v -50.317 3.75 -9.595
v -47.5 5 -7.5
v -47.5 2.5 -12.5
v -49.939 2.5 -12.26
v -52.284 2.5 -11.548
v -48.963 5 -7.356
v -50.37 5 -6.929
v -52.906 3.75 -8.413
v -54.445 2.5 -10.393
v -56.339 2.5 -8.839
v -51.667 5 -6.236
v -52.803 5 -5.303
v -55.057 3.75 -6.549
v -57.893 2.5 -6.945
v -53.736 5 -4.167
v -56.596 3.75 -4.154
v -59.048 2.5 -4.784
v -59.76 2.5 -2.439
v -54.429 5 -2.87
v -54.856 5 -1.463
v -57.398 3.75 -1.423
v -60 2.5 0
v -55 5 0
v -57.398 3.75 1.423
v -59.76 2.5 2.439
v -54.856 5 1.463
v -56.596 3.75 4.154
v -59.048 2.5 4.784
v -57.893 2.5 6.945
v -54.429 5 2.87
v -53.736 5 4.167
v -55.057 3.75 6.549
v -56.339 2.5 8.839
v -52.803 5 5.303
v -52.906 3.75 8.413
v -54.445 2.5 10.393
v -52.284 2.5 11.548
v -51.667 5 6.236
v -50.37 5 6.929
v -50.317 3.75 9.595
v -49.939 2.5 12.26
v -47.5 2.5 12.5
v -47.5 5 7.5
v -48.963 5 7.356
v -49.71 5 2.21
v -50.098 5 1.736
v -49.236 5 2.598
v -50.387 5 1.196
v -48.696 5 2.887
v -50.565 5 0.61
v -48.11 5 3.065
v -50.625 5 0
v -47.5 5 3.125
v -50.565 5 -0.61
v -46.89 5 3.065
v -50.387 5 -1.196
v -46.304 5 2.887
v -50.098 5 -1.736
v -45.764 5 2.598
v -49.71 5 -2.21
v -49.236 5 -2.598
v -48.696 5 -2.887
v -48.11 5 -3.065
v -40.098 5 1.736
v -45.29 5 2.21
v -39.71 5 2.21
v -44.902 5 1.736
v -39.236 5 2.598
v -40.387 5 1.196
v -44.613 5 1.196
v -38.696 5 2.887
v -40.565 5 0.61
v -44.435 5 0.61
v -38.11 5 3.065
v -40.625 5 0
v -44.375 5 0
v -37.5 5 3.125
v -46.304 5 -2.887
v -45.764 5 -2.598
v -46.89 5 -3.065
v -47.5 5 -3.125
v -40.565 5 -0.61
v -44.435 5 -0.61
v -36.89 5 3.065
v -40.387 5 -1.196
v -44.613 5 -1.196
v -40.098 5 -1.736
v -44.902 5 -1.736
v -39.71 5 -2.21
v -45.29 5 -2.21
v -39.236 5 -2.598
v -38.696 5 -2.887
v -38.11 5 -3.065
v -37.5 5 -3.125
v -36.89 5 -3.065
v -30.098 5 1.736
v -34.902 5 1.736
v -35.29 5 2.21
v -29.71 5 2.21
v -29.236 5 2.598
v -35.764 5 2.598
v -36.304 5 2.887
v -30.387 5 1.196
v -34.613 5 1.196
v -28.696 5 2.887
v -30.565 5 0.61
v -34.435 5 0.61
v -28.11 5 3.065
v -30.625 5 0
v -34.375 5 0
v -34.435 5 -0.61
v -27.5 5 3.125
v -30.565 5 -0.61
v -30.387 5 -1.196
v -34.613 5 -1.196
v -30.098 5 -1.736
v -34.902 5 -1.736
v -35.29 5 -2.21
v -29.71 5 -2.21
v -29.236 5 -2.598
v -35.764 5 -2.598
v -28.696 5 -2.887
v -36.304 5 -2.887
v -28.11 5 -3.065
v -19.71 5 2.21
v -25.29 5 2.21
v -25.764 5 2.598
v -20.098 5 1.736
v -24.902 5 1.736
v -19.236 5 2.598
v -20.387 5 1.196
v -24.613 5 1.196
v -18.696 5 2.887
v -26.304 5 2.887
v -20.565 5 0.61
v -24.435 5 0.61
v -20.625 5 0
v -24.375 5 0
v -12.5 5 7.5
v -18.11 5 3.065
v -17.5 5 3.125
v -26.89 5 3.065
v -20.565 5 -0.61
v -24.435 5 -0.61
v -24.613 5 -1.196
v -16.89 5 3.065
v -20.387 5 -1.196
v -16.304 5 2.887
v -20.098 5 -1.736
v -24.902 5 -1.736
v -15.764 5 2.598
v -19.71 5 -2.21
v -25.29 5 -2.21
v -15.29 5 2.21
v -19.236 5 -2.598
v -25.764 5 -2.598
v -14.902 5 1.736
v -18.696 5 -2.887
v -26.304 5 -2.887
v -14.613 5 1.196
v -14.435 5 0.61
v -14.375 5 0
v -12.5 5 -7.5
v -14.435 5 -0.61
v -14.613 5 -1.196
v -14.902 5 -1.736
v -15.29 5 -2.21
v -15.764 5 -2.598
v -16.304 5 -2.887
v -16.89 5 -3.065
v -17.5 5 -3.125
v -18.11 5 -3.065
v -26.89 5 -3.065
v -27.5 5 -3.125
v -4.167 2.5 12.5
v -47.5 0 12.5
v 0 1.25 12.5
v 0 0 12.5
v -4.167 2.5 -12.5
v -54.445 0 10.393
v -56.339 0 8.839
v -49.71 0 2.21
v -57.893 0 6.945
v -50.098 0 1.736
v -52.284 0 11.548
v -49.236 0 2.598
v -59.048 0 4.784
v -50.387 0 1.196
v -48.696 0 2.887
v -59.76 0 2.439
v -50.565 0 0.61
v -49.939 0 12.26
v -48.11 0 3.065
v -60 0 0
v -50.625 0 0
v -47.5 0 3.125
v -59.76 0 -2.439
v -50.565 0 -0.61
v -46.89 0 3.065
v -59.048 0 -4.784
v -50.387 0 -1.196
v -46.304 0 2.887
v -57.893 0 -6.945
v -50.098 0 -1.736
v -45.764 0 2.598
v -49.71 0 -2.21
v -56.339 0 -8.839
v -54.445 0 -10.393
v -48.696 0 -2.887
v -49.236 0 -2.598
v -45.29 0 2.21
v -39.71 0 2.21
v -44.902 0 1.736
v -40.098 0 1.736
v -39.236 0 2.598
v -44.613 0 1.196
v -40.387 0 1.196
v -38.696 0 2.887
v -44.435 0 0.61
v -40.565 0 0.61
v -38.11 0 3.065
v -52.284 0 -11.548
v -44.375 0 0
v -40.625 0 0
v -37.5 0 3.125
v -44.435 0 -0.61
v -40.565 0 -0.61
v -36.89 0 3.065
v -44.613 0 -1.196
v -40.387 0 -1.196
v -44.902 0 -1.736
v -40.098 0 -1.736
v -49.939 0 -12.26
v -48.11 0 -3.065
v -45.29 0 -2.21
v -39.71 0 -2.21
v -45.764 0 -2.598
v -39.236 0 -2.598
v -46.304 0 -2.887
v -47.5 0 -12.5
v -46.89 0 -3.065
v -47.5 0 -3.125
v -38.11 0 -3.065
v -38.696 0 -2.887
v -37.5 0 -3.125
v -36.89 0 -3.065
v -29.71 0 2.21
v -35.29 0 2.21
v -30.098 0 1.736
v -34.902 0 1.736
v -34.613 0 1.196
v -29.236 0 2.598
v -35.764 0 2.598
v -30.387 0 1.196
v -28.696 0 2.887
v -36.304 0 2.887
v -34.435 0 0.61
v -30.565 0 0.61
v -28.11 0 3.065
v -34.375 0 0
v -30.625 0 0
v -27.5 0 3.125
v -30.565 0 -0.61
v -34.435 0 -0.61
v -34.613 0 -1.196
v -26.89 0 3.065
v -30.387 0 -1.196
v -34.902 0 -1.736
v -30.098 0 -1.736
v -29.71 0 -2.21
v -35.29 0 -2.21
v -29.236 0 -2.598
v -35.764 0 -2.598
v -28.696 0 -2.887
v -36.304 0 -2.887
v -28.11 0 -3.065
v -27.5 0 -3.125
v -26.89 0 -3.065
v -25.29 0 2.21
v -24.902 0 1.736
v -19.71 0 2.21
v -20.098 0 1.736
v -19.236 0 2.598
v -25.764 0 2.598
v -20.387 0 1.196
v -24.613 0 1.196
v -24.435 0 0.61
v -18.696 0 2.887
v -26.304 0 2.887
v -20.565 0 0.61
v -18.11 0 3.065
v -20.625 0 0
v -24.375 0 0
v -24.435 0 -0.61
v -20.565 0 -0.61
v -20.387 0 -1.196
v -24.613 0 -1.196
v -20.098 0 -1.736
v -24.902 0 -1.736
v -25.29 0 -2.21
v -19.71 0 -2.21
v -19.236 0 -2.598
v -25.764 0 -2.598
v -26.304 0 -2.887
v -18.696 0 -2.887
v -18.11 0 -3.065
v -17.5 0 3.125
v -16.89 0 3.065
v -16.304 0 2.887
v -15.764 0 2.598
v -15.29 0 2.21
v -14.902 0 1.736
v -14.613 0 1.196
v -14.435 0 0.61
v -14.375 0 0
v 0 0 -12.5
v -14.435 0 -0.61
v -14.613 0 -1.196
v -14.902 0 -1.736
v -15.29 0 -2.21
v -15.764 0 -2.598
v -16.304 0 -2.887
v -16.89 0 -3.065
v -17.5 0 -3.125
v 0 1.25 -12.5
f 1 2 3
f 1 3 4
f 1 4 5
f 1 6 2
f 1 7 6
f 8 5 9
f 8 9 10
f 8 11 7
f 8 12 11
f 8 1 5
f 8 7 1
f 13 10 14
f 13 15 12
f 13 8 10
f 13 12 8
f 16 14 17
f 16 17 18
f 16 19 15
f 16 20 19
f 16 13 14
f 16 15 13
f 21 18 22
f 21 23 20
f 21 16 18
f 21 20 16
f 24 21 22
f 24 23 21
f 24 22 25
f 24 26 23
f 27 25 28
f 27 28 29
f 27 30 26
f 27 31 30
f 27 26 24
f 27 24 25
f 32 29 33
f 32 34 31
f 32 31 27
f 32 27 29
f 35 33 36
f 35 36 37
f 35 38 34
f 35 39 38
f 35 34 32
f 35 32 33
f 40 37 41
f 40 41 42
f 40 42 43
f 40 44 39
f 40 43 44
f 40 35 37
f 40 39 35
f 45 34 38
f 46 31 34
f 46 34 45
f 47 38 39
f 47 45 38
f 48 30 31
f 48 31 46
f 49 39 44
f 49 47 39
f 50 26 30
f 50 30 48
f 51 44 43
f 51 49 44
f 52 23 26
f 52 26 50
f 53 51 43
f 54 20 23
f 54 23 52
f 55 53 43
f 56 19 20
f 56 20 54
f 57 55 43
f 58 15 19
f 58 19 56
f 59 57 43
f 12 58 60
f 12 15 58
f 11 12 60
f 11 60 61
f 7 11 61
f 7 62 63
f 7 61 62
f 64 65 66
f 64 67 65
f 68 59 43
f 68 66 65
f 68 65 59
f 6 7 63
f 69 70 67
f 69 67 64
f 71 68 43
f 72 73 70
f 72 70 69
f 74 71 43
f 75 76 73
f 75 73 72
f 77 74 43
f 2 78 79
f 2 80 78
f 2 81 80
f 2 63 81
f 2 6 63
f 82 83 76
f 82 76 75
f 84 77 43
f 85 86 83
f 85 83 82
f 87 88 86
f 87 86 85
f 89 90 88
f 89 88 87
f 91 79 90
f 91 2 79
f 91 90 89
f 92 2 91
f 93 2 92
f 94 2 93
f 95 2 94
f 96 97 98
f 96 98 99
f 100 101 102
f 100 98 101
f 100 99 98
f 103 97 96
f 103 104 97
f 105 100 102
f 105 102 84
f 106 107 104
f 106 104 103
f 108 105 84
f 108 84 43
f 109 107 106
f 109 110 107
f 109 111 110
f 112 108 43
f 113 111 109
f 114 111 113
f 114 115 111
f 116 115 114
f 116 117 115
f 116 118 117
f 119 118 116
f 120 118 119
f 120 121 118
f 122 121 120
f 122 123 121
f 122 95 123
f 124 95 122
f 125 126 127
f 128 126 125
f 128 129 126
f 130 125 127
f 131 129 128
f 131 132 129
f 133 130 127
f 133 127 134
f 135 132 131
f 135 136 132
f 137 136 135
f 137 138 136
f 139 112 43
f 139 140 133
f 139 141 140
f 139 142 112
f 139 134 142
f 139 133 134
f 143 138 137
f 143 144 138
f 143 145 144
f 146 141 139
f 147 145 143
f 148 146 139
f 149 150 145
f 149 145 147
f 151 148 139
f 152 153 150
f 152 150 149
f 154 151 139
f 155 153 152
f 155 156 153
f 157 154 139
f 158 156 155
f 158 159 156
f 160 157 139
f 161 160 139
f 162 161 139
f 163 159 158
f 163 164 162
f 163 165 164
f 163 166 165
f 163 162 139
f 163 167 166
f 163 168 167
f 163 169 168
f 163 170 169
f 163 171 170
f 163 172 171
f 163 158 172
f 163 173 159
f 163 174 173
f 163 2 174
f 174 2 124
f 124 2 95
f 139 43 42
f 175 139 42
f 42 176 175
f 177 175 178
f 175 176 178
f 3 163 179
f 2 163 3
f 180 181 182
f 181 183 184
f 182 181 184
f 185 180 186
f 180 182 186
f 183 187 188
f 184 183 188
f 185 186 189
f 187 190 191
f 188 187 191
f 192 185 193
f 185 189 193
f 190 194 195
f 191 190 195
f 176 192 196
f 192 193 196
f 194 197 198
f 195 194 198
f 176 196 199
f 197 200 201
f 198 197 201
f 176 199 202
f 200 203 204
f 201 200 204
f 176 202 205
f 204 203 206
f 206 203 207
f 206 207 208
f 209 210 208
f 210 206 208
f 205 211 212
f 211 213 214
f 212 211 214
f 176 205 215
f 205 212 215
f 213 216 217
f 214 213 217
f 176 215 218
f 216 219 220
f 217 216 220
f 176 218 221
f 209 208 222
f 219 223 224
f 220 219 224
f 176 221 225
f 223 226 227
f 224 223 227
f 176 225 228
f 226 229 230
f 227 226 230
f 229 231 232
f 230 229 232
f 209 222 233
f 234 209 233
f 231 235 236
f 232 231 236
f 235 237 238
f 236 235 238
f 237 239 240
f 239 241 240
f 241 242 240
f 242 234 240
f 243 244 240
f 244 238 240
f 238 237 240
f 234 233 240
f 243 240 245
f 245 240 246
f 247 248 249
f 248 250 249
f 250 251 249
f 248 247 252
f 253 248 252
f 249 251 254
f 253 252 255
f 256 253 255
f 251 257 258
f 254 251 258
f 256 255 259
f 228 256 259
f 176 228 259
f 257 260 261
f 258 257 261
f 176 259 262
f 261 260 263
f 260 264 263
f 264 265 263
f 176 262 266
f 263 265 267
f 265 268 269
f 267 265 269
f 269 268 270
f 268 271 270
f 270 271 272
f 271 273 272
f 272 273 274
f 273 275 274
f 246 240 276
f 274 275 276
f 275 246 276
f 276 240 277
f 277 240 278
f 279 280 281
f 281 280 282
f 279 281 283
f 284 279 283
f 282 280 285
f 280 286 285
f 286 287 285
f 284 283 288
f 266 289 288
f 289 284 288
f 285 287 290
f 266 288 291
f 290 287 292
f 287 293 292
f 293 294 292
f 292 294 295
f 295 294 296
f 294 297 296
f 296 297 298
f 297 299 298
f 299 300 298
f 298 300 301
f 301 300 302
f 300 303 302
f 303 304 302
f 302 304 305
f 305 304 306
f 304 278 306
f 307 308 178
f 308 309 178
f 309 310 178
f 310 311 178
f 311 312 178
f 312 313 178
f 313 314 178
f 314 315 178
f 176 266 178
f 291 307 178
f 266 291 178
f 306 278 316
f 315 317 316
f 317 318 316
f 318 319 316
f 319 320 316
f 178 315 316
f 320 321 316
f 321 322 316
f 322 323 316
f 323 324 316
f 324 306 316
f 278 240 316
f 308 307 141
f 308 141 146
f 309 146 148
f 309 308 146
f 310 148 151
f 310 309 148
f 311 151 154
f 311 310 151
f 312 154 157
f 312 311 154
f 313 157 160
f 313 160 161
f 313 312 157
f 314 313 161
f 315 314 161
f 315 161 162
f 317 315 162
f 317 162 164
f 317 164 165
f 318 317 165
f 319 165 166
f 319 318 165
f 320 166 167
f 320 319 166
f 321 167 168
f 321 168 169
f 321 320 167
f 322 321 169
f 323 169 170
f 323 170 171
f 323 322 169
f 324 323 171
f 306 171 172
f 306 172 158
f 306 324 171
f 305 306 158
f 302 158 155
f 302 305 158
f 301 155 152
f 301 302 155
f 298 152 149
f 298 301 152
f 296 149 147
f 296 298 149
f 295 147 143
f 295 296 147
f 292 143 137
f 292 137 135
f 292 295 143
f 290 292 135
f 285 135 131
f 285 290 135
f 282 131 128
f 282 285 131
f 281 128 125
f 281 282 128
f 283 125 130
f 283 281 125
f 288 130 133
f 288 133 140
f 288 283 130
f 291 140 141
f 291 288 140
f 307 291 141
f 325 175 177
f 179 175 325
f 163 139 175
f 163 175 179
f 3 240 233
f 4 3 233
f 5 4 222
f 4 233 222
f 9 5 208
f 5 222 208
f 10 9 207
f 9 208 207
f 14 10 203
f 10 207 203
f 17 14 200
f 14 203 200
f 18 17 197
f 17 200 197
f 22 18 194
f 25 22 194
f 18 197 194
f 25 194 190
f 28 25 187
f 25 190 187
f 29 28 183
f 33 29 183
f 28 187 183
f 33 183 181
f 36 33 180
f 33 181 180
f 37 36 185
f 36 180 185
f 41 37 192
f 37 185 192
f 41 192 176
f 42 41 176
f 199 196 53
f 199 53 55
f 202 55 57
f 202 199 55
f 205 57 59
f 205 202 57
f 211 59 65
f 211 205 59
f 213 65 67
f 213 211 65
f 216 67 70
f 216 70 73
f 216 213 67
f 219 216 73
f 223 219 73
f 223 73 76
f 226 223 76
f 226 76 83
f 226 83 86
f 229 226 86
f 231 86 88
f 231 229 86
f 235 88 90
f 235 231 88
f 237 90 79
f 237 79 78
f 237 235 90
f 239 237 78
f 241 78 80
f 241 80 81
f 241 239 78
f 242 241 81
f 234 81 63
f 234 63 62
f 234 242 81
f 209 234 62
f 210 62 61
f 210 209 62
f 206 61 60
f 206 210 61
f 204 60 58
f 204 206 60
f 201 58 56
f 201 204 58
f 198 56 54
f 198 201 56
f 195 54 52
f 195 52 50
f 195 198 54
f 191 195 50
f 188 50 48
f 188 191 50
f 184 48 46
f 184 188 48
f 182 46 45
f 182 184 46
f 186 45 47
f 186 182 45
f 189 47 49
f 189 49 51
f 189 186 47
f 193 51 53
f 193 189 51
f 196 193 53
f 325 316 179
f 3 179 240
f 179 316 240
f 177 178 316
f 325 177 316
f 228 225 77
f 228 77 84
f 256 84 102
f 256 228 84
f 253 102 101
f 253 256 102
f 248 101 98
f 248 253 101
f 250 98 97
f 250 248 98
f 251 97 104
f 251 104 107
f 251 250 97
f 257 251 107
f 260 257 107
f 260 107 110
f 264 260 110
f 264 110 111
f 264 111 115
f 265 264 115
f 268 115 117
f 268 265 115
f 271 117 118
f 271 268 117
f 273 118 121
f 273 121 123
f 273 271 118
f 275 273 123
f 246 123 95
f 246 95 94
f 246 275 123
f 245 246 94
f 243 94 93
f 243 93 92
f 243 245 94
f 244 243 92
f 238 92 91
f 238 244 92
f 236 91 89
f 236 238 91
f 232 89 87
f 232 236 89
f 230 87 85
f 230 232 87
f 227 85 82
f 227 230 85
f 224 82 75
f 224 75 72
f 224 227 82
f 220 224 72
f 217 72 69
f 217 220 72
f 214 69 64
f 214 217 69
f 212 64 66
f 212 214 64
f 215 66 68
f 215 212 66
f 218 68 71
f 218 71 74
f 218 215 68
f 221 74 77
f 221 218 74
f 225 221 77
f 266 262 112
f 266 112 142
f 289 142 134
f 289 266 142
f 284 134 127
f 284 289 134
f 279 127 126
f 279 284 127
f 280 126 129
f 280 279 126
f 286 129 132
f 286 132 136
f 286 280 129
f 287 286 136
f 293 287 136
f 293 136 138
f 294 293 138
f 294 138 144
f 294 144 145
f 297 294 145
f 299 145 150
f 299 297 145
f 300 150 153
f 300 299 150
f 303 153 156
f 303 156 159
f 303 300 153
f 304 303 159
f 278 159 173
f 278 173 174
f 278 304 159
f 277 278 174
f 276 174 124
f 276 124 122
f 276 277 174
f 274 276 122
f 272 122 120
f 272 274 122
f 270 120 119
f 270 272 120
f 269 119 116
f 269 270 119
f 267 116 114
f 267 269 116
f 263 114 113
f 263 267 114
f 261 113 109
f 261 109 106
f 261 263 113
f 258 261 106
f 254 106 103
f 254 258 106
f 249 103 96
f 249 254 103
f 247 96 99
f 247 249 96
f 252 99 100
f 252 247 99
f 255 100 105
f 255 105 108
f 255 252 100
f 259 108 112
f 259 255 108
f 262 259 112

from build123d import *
from OCP.BRepFilletAPI import BRepFilletAPI_MakeChamfer

# Parameters (mm, degrees)
SKETCH1_R           = 3.125
BOSS_EXTRUDE1_DEPTH = 5
CHAMFER1_SIZE       = 2.5
CHAMFER1_SIZE2      = 5
CHAMFER2_SIZE       = 3.75
CHAMFER2_SIZE2      = 12.5


with BuildPart() as part:
    # Sketch1 → Boss-Extrude1 (new body)
    with BuildSketch(Plane(origin=(0, 0, 0), x_dir=(1, 0, 0), z_dir=(0, 1, 0))):
        with BuildLine():
            Line((0, -12.5), (0, 12.5))
            Line((0, 12.5), (-47.5, 12.5))
            ThreePointArc((-47.5, 12.5), (-60, 0), (-47.5, -12.5))
            Line((-47.5, -12.5), (0, -12.5))
        make_face()
        with Locations(Location((-47.5, 0, 0), (0, 0, 270))):
            Circle(SKETCH1_R, mode=Mode.SUBTRACT)
        with Locations(Location((-37.5, 0, 0), (0, 0, 270))):
            Circle(SKETCH1_R, mode=Mode.SUBTRACT)
        with Locations(Location((-27.5, 0, 0), (0, 0, 270))):
            Circle(SKETCH1_R, mode=Mode.SUBTRACT)
        with Locations(Location((-17.5, 0, 0), (0, 0, 270))):
            Circle(SKETCH1_R, mode=Mode.SUBTRACT)
    extrude(amount=BOSS_EXTRUDE1_DEPTH)

    # Chamfer1: one chamfer whose edges measure the first distance from different faces: ONE call of the kernel's chamfer builder (chamfer() names one face for all edges)
    chamfer1_edges_1 = [part.edges().sort_by_distance(p)[0] for p in [
        (-23.75, 5, -12.5),
    ]]
    chamfer1_side_1 = [part.faces().sort_by_distance(p)[0] for p in [
        (-23.75, 2.5, -12.5),
    ]]
    chamfer1_edges_2 = [part.edges().sort_by_distance(p)[0] for p in [
        (-60, 5, 0),
    ]]
    chamfer1_side_2 = [part.faces().sort_by_distance(p)[0] for p in [
        (-60, 2.5, 0),
    ]]
    chamfer1_edges_3 = [part.edges().sort_by_distance(p)[0] for p in [
        (-23.75, 5, 12.5),
    ]]
    chamfer1_side_3 = [part.faces().sort_by_distance(p)[0] for p in [
        (-23.75, 2.5, 12.5),
    ]]
    chamfer1 = BRepFilletAPI_MakeChamfer(part.part.solid().wrapped)
    for e in chamfer1_edges_1:
        chamfer1.Add(CHAMFER1_SIZE, CHAMFER1_SIZE2, e.wrapped, chamfer1_side_1[0].wrapped)  # the first distance lies on this face
    for e in chamfer1_edges_2:
        chamfer1.Add(CHAMFER1_SIZE, CHAMFER1_SIZE2, e.wrapped, chamfer1_side_2[0].wrapped)  # the first distance lies on this face
    for e in chamfer1_edges_3:
        chamfer1.Add(CHAMFER1_SIZE, CHAMFER1_SIZE2, e.wrapped, chamfer1_side_3[0].wrapped)  # the first distance lies on this face
    add(Compound.cast(chamfer1.Shape()), mode=Mode.REPLACE)

    # Chamfer2
    chamfer2_edges = [part.edges().sort_by_distance(p)[0] for p in [
        (0, 5, 0),
    ]]
    chamfer2_side = [part.faces().sort_by_distance(p)[0] for p in [
        (0, 2.314814815, 0),
    ]]
    chamfer(chamfer2_edges, length=CHAMFER2_SIZE, length2=CHAMFER2_SIZE2, reference=chamfer2_side[0])


solid = part.part
